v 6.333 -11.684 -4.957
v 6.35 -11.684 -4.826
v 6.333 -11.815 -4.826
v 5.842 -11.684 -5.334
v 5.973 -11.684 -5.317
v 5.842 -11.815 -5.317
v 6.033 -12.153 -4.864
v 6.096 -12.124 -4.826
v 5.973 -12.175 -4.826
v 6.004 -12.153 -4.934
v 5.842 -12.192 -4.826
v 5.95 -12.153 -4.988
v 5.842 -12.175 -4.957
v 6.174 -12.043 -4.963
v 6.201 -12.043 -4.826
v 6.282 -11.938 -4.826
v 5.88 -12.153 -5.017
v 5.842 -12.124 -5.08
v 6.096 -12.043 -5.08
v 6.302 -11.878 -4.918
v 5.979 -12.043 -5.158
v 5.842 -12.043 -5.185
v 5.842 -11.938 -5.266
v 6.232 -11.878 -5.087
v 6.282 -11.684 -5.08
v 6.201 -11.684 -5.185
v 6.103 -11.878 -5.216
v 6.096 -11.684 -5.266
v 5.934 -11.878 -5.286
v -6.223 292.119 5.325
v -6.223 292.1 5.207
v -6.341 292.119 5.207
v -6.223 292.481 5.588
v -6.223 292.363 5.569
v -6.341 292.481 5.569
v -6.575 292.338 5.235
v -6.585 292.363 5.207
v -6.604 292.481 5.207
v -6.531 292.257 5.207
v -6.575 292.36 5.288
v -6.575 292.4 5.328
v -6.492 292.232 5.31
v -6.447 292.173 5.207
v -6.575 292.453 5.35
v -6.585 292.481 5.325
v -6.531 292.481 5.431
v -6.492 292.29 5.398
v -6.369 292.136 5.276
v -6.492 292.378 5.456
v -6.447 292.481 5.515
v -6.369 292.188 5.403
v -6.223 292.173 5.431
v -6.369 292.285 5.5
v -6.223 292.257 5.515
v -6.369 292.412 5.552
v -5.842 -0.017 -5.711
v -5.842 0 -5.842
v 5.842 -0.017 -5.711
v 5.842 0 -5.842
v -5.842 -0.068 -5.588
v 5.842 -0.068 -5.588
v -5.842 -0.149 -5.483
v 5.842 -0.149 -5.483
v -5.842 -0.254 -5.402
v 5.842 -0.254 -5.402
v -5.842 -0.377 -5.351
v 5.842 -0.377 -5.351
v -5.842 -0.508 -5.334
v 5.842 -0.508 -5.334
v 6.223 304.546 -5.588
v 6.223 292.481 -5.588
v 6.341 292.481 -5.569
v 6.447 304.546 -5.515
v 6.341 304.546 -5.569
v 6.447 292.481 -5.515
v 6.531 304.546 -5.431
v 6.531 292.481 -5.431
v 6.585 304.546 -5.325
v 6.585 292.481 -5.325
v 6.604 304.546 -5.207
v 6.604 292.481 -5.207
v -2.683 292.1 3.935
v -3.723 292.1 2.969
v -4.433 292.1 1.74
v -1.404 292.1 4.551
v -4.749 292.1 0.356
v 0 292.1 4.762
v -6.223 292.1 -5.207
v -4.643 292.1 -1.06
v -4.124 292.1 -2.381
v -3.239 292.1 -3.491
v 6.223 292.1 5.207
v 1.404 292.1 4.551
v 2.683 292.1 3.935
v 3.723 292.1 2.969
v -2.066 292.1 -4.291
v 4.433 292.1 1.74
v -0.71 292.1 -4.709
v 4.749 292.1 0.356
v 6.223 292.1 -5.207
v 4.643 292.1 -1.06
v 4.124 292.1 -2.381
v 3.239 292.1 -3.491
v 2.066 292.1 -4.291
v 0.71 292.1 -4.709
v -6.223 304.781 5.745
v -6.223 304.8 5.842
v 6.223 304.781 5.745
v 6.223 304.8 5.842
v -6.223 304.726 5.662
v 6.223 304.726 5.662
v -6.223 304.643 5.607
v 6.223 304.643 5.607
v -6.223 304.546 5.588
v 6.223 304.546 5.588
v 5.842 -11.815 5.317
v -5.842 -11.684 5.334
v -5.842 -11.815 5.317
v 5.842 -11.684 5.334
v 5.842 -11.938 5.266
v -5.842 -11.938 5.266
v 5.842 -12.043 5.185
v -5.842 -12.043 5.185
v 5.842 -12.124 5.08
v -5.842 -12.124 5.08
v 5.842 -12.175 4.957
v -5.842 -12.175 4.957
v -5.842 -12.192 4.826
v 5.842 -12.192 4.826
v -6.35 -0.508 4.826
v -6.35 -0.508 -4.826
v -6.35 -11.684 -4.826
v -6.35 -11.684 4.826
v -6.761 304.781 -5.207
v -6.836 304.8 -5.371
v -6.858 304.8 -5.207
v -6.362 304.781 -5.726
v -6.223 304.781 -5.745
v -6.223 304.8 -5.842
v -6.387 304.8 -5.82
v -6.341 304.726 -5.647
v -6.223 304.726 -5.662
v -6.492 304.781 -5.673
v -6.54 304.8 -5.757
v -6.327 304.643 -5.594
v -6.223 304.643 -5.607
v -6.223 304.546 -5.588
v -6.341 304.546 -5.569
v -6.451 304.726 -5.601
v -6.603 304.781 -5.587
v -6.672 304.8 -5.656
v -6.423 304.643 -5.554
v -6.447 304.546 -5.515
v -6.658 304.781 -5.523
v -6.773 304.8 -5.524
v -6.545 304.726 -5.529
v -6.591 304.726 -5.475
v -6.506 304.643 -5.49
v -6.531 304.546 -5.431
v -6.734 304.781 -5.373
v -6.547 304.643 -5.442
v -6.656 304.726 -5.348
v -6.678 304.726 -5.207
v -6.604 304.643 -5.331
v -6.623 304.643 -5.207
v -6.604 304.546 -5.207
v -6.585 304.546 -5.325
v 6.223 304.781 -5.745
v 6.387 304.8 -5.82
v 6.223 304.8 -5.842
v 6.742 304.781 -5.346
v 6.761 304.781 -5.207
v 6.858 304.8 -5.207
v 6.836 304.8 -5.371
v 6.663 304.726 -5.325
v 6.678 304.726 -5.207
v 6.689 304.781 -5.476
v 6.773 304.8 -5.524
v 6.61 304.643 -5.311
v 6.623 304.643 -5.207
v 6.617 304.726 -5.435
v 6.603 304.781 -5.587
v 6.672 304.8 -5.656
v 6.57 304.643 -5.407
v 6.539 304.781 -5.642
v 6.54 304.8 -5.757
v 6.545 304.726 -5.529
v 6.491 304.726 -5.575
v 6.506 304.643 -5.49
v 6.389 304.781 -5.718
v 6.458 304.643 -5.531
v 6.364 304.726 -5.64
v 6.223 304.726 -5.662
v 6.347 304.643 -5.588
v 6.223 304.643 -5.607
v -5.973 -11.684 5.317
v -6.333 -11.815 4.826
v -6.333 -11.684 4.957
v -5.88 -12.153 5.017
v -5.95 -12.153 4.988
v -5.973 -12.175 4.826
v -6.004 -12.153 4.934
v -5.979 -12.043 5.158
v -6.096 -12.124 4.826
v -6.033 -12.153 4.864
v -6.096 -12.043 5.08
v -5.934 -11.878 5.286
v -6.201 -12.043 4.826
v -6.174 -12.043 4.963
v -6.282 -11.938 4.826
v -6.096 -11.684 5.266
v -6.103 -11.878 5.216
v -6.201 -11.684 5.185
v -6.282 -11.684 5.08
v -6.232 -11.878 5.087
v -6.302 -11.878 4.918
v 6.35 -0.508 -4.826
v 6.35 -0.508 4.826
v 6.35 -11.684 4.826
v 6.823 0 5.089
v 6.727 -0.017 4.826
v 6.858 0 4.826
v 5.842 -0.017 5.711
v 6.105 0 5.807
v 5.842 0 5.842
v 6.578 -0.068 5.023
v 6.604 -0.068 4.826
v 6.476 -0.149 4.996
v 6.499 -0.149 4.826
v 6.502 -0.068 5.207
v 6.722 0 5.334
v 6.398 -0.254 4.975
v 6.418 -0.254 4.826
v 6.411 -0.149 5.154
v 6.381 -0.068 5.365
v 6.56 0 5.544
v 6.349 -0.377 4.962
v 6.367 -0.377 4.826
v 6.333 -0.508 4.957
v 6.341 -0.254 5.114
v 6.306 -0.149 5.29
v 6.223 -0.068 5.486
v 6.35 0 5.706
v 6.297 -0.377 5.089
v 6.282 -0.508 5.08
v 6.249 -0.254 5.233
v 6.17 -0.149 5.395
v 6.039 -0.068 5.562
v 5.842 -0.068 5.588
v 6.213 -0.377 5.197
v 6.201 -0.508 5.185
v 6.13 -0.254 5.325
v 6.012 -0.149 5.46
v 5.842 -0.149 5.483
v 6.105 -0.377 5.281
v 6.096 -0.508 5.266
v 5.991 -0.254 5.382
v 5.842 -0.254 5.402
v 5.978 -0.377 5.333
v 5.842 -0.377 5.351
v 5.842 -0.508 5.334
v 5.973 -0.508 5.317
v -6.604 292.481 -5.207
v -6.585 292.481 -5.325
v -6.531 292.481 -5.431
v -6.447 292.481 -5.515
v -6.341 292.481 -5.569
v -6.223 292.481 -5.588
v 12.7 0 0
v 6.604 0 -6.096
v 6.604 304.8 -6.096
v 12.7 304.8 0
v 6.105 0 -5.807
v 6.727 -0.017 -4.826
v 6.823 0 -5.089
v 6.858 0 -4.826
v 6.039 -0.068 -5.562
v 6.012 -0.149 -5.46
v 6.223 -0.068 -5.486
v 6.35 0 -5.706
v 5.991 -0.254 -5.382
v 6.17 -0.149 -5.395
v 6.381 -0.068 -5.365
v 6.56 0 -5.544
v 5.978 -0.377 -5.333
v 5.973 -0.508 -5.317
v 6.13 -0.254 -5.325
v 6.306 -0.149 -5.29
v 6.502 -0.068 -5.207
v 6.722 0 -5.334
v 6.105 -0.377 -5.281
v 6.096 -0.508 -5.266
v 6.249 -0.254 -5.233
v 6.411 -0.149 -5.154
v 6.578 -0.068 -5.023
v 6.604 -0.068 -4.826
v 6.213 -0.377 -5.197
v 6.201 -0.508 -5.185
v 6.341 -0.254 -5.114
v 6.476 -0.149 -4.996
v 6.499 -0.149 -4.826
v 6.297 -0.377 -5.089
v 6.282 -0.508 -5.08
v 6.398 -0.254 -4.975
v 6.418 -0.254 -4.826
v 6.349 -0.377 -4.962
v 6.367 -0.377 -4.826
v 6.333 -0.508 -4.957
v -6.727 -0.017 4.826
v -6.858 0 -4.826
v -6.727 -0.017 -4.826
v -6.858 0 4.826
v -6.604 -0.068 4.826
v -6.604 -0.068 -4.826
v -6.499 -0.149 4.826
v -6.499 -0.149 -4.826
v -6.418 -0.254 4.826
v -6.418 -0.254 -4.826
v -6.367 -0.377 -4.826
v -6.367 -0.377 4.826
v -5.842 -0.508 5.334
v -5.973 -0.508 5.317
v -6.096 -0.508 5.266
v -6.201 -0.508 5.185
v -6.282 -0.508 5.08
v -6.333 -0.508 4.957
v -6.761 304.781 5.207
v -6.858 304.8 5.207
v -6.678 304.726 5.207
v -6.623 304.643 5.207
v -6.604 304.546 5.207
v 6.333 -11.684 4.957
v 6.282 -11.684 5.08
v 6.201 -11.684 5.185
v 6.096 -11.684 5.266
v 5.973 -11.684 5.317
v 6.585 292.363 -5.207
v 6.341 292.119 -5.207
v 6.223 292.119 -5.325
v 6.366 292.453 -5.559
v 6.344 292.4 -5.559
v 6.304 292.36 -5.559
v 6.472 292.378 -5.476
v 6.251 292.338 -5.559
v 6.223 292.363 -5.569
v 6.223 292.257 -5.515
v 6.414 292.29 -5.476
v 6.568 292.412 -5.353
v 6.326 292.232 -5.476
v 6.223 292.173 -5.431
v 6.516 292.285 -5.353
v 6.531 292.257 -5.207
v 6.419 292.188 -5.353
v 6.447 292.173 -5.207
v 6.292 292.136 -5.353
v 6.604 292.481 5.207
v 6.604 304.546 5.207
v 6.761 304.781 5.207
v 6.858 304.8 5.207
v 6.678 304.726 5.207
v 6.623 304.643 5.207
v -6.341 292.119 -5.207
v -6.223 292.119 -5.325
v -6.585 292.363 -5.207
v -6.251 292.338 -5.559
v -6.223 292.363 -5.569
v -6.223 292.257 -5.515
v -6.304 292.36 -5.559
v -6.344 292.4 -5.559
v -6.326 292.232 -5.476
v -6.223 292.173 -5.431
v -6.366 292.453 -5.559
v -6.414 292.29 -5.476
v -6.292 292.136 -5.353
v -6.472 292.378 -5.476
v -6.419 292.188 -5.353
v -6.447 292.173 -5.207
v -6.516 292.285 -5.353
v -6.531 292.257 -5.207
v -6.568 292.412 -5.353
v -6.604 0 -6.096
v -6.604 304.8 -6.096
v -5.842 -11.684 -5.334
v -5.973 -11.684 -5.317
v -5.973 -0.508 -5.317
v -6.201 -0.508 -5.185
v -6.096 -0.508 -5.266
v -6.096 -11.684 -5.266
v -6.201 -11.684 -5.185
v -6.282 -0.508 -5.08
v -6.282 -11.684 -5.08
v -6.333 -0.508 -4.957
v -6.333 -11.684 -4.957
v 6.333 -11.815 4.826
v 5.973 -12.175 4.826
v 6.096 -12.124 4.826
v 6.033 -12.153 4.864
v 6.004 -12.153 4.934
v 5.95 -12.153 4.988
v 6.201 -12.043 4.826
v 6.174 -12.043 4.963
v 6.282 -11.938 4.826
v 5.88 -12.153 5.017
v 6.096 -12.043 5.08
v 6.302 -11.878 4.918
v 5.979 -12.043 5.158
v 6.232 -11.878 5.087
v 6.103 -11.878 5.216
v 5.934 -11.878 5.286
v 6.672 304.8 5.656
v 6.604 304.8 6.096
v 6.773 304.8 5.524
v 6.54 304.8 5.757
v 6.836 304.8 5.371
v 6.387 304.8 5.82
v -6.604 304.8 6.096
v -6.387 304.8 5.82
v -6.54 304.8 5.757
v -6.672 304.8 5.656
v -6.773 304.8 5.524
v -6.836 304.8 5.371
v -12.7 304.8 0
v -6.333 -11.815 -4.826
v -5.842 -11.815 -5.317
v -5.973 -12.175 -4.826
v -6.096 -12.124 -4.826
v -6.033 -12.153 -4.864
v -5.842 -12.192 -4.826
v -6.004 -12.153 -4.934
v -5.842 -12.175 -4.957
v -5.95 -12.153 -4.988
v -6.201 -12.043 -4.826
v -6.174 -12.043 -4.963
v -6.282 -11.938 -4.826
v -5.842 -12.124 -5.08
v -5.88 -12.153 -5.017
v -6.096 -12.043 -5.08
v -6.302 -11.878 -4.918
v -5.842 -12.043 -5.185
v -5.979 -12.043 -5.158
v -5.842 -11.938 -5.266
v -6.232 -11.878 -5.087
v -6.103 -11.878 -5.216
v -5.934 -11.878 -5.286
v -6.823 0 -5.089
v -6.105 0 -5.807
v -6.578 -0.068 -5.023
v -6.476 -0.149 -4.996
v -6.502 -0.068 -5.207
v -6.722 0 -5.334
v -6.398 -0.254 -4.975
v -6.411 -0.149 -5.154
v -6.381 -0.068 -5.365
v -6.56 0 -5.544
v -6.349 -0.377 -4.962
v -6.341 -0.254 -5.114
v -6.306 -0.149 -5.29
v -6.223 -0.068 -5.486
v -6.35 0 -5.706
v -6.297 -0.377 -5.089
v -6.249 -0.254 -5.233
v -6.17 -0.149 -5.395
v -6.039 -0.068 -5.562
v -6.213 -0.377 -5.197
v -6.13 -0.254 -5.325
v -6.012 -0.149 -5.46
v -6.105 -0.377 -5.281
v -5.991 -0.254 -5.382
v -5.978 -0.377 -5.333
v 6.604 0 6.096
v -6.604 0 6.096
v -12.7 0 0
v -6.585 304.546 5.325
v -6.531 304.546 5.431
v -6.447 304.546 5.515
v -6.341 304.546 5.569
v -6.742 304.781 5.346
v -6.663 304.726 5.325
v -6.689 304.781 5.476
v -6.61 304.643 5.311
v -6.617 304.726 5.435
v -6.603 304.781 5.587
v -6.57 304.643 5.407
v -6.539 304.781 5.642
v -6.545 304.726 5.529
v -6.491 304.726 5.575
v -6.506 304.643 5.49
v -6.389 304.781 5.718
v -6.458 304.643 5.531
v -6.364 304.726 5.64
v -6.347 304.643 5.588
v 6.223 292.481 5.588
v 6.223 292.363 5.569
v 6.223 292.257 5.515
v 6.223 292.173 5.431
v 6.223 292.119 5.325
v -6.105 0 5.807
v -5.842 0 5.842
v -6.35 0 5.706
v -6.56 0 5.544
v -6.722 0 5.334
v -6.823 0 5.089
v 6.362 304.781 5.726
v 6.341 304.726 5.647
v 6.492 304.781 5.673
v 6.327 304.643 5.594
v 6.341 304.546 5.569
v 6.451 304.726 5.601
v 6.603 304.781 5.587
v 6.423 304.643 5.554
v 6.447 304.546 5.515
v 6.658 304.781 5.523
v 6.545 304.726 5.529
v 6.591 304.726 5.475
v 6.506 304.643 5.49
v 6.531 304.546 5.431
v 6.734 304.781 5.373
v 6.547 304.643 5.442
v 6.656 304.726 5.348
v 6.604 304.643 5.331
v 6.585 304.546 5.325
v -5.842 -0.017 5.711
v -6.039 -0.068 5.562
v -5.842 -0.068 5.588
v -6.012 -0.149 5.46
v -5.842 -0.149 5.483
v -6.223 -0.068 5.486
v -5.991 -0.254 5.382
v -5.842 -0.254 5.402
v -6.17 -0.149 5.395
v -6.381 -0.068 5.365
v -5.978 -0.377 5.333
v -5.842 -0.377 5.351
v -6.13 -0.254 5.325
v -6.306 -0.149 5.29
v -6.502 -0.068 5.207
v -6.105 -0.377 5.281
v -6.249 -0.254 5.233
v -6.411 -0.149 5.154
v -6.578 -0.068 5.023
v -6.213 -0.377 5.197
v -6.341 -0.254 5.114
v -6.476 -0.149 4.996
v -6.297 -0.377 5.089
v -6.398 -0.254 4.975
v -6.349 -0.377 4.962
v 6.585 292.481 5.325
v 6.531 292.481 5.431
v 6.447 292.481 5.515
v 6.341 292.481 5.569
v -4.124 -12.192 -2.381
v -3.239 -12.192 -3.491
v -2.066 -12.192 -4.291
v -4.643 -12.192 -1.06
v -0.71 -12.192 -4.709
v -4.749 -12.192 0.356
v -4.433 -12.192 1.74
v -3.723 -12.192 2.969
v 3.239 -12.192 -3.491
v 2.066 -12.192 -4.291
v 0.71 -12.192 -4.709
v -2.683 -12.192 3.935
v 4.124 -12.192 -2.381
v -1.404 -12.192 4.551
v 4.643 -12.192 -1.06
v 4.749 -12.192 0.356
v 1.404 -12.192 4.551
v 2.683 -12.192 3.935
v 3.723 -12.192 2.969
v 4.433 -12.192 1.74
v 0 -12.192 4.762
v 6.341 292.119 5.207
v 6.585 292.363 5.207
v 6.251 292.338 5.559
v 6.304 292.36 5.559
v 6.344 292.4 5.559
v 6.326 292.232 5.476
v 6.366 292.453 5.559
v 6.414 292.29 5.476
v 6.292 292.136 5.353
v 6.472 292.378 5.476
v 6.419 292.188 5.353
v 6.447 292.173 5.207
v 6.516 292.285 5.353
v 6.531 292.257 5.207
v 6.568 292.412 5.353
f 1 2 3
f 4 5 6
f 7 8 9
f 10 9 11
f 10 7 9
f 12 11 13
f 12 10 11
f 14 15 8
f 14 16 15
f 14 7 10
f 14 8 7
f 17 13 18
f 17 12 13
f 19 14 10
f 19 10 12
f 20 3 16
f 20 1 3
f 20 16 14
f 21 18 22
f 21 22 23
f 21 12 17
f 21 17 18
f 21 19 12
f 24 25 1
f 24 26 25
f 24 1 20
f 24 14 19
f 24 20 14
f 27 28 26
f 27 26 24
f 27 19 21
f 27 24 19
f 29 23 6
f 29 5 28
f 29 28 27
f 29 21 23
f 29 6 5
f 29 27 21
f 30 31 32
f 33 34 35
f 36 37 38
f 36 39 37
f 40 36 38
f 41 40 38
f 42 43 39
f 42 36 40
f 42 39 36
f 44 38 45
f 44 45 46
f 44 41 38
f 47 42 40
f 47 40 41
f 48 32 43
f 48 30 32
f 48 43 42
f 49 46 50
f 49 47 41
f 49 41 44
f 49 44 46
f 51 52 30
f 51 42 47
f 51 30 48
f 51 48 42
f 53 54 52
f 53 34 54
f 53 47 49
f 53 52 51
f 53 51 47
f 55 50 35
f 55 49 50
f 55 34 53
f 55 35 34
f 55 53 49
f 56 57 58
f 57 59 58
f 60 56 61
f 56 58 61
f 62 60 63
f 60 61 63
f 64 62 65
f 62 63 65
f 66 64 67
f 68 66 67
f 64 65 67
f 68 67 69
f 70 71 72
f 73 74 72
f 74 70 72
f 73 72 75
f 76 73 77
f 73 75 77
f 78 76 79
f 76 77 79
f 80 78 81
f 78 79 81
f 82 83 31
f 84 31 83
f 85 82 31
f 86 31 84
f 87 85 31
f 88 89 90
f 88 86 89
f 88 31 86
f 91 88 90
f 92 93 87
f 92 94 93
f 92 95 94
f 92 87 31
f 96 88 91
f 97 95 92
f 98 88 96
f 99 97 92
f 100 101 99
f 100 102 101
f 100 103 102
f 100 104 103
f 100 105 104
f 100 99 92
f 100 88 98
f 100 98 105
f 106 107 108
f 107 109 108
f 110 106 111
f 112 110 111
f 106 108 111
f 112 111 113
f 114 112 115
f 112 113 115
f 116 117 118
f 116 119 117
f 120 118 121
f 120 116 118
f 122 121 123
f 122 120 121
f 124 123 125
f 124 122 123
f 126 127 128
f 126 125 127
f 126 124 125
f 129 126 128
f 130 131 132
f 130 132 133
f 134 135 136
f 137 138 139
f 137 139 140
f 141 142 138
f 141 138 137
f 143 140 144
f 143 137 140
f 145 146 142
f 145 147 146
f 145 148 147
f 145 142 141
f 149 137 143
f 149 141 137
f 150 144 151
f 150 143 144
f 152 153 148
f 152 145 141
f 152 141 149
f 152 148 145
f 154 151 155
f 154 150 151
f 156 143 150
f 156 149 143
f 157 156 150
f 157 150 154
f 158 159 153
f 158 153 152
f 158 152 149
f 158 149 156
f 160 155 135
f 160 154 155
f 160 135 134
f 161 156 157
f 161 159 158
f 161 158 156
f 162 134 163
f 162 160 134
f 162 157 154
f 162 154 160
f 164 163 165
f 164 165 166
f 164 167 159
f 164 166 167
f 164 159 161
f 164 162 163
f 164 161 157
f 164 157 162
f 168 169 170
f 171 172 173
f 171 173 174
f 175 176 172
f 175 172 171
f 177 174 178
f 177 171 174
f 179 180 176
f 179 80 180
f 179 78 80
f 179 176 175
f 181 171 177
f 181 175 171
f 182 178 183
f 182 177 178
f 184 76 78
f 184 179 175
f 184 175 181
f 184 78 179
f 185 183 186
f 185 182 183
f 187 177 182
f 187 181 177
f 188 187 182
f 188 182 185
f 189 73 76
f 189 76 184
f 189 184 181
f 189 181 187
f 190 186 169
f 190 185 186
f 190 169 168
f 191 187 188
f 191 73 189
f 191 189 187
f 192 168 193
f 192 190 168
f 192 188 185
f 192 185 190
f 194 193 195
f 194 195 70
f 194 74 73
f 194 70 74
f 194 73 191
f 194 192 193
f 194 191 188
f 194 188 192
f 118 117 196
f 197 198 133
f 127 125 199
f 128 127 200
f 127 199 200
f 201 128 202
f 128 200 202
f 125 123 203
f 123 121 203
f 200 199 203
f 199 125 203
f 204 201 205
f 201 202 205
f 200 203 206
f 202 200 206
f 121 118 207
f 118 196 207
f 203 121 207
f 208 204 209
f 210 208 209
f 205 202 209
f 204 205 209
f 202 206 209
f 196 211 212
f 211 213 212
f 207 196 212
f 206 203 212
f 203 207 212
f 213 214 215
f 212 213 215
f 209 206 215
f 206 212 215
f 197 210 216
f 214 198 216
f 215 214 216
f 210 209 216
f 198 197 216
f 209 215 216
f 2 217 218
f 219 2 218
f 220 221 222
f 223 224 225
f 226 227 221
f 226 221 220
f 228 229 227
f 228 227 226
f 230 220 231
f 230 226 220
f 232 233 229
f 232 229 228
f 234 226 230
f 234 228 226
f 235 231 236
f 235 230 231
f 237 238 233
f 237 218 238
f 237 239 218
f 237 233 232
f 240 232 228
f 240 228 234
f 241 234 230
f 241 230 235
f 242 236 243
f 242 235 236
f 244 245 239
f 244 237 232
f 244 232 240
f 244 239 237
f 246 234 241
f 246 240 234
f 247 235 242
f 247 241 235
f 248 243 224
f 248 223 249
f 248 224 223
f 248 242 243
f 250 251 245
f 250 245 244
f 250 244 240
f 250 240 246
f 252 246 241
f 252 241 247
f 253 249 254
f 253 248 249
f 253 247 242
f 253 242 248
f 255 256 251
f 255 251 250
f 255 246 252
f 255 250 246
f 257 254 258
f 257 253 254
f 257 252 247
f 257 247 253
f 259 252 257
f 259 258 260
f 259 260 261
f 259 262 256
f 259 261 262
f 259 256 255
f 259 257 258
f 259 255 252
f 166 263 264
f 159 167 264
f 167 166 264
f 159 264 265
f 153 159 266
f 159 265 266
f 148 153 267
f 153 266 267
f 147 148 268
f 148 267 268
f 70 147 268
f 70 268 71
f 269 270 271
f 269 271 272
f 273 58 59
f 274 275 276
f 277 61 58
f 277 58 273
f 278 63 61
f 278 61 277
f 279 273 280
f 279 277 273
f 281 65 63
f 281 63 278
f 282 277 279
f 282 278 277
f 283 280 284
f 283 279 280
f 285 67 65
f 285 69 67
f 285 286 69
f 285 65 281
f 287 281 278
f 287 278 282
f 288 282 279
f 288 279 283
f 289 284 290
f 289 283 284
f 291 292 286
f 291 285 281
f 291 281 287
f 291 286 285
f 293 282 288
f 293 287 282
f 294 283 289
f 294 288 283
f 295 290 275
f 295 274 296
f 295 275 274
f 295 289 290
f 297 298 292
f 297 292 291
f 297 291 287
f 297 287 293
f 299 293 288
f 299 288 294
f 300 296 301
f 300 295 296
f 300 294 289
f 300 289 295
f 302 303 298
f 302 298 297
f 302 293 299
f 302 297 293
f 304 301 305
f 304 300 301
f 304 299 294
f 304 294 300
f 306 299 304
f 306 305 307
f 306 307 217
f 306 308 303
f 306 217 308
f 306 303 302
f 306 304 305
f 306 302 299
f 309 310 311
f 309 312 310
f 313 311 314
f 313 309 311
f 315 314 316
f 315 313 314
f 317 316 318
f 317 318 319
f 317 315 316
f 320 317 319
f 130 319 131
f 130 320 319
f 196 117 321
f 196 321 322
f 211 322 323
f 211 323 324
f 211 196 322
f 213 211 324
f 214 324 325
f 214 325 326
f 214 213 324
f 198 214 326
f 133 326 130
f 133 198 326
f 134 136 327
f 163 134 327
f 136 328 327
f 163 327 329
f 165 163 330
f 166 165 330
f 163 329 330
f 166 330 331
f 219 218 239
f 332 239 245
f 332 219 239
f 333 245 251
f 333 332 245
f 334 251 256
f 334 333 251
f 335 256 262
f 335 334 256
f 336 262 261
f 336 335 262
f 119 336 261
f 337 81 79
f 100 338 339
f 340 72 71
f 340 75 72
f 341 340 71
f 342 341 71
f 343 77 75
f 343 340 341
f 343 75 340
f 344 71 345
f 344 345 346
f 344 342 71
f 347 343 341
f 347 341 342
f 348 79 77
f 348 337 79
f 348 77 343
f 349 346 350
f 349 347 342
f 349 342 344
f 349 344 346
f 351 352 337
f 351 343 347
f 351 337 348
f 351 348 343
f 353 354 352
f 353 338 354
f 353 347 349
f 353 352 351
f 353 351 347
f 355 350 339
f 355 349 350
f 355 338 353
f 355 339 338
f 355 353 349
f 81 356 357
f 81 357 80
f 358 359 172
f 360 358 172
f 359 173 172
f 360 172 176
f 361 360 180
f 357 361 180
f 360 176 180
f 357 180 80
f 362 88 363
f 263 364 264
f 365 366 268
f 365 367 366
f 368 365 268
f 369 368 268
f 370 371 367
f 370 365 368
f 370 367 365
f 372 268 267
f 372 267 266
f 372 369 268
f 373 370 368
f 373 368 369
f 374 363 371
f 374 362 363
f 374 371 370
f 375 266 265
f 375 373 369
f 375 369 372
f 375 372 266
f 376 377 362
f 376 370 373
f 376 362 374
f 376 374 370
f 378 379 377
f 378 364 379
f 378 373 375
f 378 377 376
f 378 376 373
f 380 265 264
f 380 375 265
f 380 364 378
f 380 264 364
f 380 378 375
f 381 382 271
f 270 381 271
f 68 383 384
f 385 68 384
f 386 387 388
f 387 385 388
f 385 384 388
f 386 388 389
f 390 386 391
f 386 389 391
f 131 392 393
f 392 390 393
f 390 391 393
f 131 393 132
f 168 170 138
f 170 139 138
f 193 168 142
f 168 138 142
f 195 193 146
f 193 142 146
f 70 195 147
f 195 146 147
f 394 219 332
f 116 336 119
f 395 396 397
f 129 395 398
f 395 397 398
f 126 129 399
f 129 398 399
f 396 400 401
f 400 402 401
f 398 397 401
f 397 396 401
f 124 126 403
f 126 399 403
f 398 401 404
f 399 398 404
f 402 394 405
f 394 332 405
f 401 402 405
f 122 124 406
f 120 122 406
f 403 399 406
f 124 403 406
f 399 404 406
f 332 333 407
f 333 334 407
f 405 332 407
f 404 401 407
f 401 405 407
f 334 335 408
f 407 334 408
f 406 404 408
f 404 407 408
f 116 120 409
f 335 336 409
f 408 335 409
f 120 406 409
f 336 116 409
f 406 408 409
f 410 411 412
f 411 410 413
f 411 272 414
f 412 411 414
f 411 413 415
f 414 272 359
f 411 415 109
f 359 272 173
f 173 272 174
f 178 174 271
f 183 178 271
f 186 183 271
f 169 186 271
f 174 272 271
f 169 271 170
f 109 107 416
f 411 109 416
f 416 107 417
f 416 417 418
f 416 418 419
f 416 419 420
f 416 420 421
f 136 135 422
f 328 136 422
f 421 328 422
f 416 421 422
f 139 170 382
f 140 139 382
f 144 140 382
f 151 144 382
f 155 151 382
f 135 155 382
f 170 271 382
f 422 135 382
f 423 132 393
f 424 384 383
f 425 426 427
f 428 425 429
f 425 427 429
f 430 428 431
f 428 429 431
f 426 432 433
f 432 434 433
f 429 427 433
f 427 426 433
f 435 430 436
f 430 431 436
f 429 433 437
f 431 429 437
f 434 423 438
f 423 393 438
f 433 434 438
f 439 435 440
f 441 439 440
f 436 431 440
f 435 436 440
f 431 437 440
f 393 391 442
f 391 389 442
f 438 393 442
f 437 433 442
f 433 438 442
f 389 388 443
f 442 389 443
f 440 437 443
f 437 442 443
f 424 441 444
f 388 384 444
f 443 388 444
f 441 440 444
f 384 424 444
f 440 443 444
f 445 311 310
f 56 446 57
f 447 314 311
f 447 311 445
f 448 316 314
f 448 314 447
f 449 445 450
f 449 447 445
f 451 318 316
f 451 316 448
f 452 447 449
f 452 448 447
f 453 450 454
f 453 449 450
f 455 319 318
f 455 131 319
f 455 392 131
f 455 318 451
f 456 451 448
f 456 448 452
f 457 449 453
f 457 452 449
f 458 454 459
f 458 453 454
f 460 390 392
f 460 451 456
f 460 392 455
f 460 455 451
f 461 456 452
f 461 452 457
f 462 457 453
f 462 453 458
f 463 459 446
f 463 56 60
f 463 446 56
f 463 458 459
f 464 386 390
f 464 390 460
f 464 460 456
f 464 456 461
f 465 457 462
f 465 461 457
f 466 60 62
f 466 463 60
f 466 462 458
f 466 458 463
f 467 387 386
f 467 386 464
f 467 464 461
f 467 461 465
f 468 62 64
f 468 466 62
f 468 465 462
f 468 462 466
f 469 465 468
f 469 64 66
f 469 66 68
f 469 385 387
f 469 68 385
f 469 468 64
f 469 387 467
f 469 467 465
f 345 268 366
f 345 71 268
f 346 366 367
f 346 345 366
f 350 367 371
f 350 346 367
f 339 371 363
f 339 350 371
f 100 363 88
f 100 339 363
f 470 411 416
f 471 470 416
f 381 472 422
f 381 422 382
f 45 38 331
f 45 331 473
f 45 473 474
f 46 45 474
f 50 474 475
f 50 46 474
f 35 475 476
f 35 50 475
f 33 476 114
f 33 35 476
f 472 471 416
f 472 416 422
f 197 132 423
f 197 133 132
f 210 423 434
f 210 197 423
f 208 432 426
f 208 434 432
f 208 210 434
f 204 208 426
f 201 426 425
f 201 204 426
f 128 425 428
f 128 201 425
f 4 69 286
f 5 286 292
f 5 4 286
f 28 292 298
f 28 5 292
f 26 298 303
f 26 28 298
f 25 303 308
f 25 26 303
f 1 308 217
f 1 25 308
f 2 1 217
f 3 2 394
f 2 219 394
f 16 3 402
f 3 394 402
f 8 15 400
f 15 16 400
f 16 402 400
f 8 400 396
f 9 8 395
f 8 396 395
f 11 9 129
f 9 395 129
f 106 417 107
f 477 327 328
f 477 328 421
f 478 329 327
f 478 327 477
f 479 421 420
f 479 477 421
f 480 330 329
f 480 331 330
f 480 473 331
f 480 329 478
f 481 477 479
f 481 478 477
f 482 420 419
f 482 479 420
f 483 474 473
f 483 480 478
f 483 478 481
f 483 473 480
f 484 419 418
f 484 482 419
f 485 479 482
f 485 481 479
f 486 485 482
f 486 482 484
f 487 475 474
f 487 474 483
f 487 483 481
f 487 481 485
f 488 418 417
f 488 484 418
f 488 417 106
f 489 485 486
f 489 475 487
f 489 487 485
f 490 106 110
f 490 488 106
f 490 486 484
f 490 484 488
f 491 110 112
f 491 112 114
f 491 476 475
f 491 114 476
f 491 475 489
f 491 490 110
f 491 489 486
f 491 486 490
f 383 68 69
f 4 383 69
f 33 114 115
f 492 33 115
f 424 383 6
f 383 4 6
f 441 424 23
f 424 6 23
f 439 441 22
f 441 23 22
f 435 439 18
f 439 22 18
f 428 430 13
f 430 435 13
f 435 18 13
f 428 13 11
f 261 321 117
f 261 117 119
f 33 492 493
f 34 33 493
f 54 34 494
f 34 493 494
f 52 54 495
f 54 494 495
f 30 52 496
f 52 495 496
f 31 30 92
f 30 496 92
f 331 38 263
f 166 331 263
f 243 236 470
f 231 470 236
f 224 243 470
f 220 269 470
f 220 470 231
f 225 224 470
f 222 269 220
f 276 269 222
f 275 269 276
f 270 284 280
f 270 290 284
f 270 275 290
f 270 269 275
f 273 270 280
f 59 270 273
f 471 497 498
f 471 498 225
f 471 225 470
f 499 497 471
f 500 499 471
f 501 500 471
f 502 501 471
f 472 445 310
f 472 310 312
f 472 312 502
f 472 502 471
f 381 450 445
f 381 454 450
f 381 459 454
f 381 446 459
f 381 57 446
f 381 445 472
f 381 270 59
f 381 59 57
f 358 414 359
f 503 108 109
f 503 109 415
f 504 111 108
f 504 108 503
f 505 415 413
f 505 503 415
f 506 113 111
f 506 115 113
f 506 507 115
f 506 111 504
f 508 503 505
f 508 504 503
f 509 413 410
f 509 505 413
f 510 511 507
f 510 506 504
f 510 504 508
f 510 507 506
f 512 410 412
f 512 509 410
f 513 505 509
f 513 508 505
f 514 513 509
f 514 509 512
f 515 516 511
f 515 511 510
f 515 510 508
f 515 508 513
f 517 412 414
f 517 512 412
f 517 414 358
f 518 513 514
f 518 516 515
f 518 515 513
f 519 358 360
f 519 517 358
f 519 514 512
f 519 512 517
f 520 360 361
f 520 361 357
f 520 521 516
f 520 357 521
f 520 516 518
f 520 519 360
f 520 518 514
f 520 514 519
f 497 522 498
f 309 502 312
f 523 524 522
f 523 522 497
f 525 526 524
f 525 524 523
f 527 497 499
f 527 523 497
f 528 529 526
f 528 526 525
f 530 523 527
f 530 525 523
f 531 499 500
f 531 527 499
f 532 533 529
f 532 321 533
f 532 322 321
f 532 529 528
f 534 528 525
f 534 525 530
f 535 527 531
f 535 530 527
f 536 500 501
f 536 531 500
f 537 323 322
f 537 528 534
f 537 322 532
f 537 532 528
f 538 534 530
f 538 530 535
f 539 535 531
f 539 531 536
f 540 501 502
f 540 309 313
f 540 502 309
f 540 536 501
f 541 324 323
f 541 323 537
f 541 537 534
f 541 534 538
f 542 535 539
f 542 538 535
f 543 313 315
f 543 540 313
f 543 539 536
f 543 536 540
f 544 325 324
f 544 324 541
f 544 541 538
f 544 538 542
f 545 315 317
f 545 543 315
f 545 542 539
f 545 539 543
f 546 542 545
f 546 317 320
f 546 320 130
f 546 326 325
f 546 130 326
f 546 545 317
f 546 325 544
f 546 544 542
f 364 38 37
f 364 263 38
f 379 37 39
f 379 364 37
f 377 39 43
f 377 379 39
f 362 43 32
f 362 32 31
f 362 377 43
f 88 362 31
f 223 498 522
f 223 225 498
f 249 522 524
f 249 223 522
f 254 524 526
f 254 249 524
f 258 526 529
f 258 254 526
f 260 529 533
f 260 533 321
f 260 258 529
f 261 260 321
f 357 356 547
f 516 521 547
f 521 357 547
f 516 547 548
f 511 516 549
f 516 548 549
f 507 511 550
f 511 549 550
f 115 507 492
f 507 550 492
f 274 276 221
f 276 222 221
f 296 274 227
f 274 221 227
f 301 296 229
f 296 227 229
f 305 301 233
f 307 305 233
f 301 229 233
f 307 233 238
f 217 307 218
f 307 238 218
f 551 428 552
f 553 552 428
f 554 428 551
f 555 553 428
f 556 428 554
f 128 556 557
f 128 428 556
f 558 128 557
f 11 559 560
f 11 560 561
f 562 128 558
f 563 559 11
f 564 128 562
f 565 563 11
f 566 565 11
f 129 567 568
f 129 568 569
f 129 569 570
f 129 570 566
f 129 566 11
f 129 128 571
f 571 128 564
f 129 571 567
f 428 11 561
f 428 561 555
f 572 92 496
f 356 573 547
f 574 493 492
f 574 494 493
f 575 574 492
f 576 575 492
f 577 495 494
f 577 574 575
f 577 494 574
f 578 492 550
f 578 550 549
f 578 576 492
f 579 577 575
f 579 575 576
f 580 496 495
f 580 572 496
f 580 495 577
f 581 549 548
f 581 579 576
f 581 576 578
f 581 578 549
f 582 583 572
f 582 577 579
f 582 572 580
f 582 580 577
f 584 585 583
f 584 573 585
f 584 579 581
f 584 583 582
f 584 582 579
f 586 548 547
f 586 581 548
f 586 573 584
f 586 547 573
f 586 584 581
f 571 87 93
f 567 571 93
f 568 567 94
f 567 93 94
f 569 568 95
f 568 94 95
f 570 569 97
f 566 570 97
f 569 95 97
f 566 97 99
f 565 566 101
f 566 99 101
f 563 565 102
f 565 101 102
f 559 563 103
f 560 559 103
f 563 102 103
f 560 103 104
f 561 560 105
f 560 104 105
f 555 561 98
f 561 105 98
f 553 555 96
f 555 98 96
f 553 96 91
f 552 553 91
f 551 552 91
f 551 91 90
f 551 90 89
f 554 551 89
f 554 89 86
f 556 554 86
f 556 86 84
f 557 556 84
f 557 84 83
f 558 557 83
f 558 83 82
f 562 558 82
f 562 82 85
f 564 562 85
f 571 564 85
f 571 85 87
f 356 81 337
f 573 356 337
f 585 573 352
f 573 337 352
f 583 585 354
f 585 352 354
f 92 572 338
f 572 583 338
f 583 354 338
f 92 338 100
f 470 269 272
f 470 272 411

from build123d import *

# Parameters (mm, degrees)
BOSS_EXTRUDE2_DEPTH = 304.8
SKETCH3_W           = 12.7
SKETCH3_H           = 10.668
BOSS_EXTRUDE3_DEPTH = 12.192
FILLET1_R           = 0.508
SKETCH4_R           = 4.7625
CUT_EXTRUDE1_DEPTH  = 318.304868037
SKETCH5_W           = 13.208
SKETCH5_H           = 11.176
CUT_EXTRUDE2_DEPTH  = 12.7
FILLET3_R           = 0.381
FILLET4_R           = 0.254


with BuildPart() as part:
    # Sketch2 → Boss-Extrude2 (new body)
    with BuildSketch(Plane(origin=(0, 0, 0), x_dir=(1, 0, 0), z_dir=(0, 1, 0))):
        Polygon((-6.604, 6.096), (6.604, 6.096), (12.7, 0), (6.604, -6.096), (-6.604, -6.096), (-12.7, 0), align=None)
    extrude(amount=BOSS_EXTRUDE2_DEPTH)

    # Sketch3 → Boss-Extrude3 (add)
    with BuildSketch(Plane.XZ):
        Rectangle(SKETCH3_W, SKETCH3_H)
    extrude(amount=BOSS_EXTRUDE3_DEPTH)

    # Fillet1
    fillet1_edges = [part.edges().sort_by_distance(p)[0] for p in [
        (6.35, 0, 0),
        (6.35, -6.096, -5.334),
        (0, 0, 5.334),
        (6.35, -6.096, 5.334),
        (-6.35, 0, 0),
        (-6.35, -6.096, 5.334),
        (0, 0, -5.334),
        (-6.35, -6.096, -5.334),
        (6.35, -12.192, 0),
        (0, -12.192, 5.334),
        (-6.35, -12.192, 0),
        (0, -12.192, -5.334),
    ]]
    fillet(fillet1_edges, radius=FILLET1_R)

    # Sketch4 → Cut-Extrude1 (cut, through all)
    with BuildSketch(Plane(origin=(0, 304.8, 0), x_dir=(1, 0, 0), z_dir=(0, 1, 0))):
        with Locations(Location((0, 0, 0), (0, 0, 270))):
            Circle(SKETCH4_R)
    extrude(amount=-CUT_EXTRUDE1_DEPTH, mode=Mode.SUBTRACT)

    # Sketch5 → Cut-Extrude2 (cut)
    with BuildSketch(Plane(origin=(0, 304.8, 0), x_dir=(1, 0, 0), z_dir=(0, 1, 0))):
        Rectangle(SKETCH5_W, SKETCH5_H)
    extrude(amount=-CUT_EXTRUDE2_DEPTH, mode=Mode.SUBTRACT)

    # Fillet3
    fillet3_edges = [part.edges().sort_by_distance(p)[0] for p in [
        (6.604, 292.1, 0),
        (6.604, 298.45, -5.588),
        (0, 292.1, 5.588),
        (6.604, 298.45, 5.588),
        (-6.604, 292.1, 0),
        (-6.604, 298.45, 5.588),
        (0, 292.1, -5.588),
        (-6.604, 298.45, -5.588),
    ]]
    fillet(fillet3_edges, radius=FILLET3_R)

    # Fillet4
    fillet4_edges = [part.edges().sort_by_distance(p)[0] for p in [
        (0, 304.8, 5.588),
        (-6.604, 304.8, 0),
        (6.492407684, 304.8, -5.476407684),
        (6.492407684, 304.8, 5.476407684),
        (-6.492407684, 304.8, 5.476407684),
        (-6.492407684, 304.8, -5.476407684),
        (0, 304.8, -5.588),
        (6.604, 304.8, 0),
    ]]
    fillet(fillet4_edges, radius=FILLET4_R)


solid = part.part
